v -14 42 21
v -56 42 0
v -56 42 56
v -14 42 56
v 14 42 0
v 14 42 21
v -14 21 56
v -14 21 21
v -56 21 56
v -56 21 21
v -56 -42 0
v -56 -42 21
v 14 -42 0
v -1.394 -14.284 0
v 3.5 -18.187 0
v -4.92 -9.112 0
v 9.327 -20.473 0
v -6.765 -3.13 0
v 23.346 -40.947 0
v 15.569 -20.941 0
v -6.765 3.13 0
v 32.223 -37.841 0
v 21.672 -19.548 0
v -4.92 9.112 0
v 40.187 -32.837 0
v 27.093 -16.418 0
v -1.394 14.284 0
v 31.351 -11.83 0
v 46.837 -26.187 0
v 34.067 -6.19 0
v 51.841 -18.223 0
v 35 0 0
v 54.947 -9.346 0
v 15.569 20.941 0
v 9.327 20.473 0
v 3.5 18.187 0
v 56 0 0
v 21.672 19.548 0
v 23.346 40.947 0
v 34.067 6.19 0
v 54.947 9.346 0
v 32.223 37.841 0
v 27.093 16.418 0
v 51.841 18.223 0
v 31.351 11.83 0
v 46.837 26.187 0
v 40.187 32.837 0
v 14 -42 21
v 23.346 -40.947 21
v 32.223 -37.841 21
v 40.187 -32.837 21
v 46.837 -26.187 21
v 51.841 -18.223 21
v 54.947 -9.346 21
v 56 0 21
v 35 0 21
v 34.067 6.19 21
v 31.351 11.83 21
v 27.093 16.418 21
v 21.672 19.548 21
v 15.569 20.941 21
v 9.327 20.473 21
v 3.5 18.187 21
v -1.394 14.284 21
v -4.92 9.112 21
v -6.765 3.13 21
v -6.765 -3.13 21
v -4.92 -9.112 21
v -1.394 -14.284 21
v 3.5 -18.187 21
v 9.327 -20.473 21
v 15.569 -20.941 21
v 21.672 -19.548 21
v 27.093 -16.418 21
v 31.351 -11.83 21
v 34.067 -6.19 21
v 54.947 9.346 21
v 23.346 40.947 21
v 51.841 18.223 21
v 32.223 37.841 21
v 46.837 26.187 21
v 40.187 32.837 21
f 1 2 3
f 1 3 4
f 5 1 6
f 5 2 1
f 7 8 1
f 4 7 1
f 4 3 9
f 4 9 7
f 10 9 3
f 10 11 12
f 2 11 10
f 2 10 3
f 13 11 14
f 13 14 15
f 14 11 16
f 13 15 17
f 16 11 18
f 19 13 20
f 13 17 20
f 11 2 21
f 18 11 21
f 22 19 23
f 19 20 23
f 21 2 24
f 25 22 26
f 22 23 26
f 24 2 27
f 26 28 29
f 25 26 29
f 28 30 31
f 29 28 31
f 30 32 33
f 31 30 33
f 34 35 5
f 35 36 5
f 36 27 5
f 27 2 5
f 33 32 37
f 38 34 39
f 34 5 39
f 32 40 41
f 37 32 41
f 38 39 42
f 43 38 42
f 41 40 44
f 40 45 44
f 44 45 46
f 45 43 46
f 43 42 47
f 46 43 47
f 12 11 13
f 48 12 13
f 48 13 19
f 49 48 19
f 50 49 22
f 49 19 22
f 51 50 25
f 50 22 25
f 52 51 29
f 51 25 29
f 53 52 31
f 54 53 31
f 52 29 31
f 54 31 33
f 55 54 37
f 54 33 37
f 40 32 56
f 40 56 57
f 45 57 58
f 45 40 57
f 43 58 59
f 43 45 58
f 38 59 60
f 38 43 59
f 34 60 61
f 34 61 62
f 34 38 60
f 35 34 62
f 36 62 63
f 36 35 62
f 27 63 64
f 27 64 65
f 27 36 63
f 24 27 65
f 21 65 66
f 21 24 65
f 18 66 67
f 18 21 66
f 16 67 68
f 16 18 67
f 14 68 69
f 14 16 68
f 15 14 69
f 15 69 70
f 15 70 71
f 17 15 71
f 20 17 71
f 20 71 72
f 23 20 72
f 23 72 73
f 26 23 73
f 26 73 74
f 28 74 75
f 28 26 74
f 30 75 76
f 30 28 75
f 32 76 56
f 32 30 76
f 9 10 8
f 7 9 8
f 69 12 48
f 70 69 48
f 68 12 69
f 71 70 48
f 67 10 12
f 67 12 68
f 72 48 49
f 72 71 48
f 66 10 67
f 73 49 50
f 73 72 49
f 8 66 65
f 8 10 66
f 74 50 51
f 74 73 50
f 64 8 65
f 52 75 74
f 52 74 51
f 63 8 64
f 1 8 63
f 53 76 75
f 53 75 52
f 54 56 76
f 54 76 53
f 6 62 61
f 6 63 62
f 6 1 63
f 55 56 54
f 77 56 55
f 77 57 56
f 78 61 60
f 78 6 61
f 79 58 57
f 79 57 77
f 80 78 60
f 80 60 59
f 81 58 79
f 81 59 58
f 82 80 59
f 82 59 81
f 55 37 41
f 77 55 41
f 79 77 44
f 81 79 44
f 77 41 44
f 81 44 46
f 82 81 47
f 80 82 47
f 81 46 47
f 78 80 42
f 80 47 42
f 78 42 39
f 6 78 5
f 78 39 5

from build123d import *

# Parameters (mm, degrees)
F0_R     = 21
F1_DEPTH = 21
F2_W     = 42
F2_H     = 21
F3_DEPTH = 35


with BuildPart() as f1:
    # F0 (on Top) → F1 (new body)
    with BuildSketch(Plane.XY):
        with BuildLine():
            Line((14, 42), (-56, 42))
            Line((-56, 42), (-56, -42))
            Line((-56, -42), (14, -42))
            ThreePointArc((14, -42), (43.698485, -29.698485), (56, 0))
            ThreePointArc((56, 0), (43.698485, 29.698485), (14, 42))
        make_face()
        with Locations((14, 0)):
            Circle(F0_R, mode=Mode.SUBTRACT)
    extrude(amount=F1_DEPTH)

    # F2 (on face) → F3 (join)
    with BuildSketch(Plane.XY.offset(21)):
        with Locations((-35, 31.5)):
            Rectangle(F2_W, F2_H)
    extrude(amount=F3_DEPTH)


solid = f1.part
